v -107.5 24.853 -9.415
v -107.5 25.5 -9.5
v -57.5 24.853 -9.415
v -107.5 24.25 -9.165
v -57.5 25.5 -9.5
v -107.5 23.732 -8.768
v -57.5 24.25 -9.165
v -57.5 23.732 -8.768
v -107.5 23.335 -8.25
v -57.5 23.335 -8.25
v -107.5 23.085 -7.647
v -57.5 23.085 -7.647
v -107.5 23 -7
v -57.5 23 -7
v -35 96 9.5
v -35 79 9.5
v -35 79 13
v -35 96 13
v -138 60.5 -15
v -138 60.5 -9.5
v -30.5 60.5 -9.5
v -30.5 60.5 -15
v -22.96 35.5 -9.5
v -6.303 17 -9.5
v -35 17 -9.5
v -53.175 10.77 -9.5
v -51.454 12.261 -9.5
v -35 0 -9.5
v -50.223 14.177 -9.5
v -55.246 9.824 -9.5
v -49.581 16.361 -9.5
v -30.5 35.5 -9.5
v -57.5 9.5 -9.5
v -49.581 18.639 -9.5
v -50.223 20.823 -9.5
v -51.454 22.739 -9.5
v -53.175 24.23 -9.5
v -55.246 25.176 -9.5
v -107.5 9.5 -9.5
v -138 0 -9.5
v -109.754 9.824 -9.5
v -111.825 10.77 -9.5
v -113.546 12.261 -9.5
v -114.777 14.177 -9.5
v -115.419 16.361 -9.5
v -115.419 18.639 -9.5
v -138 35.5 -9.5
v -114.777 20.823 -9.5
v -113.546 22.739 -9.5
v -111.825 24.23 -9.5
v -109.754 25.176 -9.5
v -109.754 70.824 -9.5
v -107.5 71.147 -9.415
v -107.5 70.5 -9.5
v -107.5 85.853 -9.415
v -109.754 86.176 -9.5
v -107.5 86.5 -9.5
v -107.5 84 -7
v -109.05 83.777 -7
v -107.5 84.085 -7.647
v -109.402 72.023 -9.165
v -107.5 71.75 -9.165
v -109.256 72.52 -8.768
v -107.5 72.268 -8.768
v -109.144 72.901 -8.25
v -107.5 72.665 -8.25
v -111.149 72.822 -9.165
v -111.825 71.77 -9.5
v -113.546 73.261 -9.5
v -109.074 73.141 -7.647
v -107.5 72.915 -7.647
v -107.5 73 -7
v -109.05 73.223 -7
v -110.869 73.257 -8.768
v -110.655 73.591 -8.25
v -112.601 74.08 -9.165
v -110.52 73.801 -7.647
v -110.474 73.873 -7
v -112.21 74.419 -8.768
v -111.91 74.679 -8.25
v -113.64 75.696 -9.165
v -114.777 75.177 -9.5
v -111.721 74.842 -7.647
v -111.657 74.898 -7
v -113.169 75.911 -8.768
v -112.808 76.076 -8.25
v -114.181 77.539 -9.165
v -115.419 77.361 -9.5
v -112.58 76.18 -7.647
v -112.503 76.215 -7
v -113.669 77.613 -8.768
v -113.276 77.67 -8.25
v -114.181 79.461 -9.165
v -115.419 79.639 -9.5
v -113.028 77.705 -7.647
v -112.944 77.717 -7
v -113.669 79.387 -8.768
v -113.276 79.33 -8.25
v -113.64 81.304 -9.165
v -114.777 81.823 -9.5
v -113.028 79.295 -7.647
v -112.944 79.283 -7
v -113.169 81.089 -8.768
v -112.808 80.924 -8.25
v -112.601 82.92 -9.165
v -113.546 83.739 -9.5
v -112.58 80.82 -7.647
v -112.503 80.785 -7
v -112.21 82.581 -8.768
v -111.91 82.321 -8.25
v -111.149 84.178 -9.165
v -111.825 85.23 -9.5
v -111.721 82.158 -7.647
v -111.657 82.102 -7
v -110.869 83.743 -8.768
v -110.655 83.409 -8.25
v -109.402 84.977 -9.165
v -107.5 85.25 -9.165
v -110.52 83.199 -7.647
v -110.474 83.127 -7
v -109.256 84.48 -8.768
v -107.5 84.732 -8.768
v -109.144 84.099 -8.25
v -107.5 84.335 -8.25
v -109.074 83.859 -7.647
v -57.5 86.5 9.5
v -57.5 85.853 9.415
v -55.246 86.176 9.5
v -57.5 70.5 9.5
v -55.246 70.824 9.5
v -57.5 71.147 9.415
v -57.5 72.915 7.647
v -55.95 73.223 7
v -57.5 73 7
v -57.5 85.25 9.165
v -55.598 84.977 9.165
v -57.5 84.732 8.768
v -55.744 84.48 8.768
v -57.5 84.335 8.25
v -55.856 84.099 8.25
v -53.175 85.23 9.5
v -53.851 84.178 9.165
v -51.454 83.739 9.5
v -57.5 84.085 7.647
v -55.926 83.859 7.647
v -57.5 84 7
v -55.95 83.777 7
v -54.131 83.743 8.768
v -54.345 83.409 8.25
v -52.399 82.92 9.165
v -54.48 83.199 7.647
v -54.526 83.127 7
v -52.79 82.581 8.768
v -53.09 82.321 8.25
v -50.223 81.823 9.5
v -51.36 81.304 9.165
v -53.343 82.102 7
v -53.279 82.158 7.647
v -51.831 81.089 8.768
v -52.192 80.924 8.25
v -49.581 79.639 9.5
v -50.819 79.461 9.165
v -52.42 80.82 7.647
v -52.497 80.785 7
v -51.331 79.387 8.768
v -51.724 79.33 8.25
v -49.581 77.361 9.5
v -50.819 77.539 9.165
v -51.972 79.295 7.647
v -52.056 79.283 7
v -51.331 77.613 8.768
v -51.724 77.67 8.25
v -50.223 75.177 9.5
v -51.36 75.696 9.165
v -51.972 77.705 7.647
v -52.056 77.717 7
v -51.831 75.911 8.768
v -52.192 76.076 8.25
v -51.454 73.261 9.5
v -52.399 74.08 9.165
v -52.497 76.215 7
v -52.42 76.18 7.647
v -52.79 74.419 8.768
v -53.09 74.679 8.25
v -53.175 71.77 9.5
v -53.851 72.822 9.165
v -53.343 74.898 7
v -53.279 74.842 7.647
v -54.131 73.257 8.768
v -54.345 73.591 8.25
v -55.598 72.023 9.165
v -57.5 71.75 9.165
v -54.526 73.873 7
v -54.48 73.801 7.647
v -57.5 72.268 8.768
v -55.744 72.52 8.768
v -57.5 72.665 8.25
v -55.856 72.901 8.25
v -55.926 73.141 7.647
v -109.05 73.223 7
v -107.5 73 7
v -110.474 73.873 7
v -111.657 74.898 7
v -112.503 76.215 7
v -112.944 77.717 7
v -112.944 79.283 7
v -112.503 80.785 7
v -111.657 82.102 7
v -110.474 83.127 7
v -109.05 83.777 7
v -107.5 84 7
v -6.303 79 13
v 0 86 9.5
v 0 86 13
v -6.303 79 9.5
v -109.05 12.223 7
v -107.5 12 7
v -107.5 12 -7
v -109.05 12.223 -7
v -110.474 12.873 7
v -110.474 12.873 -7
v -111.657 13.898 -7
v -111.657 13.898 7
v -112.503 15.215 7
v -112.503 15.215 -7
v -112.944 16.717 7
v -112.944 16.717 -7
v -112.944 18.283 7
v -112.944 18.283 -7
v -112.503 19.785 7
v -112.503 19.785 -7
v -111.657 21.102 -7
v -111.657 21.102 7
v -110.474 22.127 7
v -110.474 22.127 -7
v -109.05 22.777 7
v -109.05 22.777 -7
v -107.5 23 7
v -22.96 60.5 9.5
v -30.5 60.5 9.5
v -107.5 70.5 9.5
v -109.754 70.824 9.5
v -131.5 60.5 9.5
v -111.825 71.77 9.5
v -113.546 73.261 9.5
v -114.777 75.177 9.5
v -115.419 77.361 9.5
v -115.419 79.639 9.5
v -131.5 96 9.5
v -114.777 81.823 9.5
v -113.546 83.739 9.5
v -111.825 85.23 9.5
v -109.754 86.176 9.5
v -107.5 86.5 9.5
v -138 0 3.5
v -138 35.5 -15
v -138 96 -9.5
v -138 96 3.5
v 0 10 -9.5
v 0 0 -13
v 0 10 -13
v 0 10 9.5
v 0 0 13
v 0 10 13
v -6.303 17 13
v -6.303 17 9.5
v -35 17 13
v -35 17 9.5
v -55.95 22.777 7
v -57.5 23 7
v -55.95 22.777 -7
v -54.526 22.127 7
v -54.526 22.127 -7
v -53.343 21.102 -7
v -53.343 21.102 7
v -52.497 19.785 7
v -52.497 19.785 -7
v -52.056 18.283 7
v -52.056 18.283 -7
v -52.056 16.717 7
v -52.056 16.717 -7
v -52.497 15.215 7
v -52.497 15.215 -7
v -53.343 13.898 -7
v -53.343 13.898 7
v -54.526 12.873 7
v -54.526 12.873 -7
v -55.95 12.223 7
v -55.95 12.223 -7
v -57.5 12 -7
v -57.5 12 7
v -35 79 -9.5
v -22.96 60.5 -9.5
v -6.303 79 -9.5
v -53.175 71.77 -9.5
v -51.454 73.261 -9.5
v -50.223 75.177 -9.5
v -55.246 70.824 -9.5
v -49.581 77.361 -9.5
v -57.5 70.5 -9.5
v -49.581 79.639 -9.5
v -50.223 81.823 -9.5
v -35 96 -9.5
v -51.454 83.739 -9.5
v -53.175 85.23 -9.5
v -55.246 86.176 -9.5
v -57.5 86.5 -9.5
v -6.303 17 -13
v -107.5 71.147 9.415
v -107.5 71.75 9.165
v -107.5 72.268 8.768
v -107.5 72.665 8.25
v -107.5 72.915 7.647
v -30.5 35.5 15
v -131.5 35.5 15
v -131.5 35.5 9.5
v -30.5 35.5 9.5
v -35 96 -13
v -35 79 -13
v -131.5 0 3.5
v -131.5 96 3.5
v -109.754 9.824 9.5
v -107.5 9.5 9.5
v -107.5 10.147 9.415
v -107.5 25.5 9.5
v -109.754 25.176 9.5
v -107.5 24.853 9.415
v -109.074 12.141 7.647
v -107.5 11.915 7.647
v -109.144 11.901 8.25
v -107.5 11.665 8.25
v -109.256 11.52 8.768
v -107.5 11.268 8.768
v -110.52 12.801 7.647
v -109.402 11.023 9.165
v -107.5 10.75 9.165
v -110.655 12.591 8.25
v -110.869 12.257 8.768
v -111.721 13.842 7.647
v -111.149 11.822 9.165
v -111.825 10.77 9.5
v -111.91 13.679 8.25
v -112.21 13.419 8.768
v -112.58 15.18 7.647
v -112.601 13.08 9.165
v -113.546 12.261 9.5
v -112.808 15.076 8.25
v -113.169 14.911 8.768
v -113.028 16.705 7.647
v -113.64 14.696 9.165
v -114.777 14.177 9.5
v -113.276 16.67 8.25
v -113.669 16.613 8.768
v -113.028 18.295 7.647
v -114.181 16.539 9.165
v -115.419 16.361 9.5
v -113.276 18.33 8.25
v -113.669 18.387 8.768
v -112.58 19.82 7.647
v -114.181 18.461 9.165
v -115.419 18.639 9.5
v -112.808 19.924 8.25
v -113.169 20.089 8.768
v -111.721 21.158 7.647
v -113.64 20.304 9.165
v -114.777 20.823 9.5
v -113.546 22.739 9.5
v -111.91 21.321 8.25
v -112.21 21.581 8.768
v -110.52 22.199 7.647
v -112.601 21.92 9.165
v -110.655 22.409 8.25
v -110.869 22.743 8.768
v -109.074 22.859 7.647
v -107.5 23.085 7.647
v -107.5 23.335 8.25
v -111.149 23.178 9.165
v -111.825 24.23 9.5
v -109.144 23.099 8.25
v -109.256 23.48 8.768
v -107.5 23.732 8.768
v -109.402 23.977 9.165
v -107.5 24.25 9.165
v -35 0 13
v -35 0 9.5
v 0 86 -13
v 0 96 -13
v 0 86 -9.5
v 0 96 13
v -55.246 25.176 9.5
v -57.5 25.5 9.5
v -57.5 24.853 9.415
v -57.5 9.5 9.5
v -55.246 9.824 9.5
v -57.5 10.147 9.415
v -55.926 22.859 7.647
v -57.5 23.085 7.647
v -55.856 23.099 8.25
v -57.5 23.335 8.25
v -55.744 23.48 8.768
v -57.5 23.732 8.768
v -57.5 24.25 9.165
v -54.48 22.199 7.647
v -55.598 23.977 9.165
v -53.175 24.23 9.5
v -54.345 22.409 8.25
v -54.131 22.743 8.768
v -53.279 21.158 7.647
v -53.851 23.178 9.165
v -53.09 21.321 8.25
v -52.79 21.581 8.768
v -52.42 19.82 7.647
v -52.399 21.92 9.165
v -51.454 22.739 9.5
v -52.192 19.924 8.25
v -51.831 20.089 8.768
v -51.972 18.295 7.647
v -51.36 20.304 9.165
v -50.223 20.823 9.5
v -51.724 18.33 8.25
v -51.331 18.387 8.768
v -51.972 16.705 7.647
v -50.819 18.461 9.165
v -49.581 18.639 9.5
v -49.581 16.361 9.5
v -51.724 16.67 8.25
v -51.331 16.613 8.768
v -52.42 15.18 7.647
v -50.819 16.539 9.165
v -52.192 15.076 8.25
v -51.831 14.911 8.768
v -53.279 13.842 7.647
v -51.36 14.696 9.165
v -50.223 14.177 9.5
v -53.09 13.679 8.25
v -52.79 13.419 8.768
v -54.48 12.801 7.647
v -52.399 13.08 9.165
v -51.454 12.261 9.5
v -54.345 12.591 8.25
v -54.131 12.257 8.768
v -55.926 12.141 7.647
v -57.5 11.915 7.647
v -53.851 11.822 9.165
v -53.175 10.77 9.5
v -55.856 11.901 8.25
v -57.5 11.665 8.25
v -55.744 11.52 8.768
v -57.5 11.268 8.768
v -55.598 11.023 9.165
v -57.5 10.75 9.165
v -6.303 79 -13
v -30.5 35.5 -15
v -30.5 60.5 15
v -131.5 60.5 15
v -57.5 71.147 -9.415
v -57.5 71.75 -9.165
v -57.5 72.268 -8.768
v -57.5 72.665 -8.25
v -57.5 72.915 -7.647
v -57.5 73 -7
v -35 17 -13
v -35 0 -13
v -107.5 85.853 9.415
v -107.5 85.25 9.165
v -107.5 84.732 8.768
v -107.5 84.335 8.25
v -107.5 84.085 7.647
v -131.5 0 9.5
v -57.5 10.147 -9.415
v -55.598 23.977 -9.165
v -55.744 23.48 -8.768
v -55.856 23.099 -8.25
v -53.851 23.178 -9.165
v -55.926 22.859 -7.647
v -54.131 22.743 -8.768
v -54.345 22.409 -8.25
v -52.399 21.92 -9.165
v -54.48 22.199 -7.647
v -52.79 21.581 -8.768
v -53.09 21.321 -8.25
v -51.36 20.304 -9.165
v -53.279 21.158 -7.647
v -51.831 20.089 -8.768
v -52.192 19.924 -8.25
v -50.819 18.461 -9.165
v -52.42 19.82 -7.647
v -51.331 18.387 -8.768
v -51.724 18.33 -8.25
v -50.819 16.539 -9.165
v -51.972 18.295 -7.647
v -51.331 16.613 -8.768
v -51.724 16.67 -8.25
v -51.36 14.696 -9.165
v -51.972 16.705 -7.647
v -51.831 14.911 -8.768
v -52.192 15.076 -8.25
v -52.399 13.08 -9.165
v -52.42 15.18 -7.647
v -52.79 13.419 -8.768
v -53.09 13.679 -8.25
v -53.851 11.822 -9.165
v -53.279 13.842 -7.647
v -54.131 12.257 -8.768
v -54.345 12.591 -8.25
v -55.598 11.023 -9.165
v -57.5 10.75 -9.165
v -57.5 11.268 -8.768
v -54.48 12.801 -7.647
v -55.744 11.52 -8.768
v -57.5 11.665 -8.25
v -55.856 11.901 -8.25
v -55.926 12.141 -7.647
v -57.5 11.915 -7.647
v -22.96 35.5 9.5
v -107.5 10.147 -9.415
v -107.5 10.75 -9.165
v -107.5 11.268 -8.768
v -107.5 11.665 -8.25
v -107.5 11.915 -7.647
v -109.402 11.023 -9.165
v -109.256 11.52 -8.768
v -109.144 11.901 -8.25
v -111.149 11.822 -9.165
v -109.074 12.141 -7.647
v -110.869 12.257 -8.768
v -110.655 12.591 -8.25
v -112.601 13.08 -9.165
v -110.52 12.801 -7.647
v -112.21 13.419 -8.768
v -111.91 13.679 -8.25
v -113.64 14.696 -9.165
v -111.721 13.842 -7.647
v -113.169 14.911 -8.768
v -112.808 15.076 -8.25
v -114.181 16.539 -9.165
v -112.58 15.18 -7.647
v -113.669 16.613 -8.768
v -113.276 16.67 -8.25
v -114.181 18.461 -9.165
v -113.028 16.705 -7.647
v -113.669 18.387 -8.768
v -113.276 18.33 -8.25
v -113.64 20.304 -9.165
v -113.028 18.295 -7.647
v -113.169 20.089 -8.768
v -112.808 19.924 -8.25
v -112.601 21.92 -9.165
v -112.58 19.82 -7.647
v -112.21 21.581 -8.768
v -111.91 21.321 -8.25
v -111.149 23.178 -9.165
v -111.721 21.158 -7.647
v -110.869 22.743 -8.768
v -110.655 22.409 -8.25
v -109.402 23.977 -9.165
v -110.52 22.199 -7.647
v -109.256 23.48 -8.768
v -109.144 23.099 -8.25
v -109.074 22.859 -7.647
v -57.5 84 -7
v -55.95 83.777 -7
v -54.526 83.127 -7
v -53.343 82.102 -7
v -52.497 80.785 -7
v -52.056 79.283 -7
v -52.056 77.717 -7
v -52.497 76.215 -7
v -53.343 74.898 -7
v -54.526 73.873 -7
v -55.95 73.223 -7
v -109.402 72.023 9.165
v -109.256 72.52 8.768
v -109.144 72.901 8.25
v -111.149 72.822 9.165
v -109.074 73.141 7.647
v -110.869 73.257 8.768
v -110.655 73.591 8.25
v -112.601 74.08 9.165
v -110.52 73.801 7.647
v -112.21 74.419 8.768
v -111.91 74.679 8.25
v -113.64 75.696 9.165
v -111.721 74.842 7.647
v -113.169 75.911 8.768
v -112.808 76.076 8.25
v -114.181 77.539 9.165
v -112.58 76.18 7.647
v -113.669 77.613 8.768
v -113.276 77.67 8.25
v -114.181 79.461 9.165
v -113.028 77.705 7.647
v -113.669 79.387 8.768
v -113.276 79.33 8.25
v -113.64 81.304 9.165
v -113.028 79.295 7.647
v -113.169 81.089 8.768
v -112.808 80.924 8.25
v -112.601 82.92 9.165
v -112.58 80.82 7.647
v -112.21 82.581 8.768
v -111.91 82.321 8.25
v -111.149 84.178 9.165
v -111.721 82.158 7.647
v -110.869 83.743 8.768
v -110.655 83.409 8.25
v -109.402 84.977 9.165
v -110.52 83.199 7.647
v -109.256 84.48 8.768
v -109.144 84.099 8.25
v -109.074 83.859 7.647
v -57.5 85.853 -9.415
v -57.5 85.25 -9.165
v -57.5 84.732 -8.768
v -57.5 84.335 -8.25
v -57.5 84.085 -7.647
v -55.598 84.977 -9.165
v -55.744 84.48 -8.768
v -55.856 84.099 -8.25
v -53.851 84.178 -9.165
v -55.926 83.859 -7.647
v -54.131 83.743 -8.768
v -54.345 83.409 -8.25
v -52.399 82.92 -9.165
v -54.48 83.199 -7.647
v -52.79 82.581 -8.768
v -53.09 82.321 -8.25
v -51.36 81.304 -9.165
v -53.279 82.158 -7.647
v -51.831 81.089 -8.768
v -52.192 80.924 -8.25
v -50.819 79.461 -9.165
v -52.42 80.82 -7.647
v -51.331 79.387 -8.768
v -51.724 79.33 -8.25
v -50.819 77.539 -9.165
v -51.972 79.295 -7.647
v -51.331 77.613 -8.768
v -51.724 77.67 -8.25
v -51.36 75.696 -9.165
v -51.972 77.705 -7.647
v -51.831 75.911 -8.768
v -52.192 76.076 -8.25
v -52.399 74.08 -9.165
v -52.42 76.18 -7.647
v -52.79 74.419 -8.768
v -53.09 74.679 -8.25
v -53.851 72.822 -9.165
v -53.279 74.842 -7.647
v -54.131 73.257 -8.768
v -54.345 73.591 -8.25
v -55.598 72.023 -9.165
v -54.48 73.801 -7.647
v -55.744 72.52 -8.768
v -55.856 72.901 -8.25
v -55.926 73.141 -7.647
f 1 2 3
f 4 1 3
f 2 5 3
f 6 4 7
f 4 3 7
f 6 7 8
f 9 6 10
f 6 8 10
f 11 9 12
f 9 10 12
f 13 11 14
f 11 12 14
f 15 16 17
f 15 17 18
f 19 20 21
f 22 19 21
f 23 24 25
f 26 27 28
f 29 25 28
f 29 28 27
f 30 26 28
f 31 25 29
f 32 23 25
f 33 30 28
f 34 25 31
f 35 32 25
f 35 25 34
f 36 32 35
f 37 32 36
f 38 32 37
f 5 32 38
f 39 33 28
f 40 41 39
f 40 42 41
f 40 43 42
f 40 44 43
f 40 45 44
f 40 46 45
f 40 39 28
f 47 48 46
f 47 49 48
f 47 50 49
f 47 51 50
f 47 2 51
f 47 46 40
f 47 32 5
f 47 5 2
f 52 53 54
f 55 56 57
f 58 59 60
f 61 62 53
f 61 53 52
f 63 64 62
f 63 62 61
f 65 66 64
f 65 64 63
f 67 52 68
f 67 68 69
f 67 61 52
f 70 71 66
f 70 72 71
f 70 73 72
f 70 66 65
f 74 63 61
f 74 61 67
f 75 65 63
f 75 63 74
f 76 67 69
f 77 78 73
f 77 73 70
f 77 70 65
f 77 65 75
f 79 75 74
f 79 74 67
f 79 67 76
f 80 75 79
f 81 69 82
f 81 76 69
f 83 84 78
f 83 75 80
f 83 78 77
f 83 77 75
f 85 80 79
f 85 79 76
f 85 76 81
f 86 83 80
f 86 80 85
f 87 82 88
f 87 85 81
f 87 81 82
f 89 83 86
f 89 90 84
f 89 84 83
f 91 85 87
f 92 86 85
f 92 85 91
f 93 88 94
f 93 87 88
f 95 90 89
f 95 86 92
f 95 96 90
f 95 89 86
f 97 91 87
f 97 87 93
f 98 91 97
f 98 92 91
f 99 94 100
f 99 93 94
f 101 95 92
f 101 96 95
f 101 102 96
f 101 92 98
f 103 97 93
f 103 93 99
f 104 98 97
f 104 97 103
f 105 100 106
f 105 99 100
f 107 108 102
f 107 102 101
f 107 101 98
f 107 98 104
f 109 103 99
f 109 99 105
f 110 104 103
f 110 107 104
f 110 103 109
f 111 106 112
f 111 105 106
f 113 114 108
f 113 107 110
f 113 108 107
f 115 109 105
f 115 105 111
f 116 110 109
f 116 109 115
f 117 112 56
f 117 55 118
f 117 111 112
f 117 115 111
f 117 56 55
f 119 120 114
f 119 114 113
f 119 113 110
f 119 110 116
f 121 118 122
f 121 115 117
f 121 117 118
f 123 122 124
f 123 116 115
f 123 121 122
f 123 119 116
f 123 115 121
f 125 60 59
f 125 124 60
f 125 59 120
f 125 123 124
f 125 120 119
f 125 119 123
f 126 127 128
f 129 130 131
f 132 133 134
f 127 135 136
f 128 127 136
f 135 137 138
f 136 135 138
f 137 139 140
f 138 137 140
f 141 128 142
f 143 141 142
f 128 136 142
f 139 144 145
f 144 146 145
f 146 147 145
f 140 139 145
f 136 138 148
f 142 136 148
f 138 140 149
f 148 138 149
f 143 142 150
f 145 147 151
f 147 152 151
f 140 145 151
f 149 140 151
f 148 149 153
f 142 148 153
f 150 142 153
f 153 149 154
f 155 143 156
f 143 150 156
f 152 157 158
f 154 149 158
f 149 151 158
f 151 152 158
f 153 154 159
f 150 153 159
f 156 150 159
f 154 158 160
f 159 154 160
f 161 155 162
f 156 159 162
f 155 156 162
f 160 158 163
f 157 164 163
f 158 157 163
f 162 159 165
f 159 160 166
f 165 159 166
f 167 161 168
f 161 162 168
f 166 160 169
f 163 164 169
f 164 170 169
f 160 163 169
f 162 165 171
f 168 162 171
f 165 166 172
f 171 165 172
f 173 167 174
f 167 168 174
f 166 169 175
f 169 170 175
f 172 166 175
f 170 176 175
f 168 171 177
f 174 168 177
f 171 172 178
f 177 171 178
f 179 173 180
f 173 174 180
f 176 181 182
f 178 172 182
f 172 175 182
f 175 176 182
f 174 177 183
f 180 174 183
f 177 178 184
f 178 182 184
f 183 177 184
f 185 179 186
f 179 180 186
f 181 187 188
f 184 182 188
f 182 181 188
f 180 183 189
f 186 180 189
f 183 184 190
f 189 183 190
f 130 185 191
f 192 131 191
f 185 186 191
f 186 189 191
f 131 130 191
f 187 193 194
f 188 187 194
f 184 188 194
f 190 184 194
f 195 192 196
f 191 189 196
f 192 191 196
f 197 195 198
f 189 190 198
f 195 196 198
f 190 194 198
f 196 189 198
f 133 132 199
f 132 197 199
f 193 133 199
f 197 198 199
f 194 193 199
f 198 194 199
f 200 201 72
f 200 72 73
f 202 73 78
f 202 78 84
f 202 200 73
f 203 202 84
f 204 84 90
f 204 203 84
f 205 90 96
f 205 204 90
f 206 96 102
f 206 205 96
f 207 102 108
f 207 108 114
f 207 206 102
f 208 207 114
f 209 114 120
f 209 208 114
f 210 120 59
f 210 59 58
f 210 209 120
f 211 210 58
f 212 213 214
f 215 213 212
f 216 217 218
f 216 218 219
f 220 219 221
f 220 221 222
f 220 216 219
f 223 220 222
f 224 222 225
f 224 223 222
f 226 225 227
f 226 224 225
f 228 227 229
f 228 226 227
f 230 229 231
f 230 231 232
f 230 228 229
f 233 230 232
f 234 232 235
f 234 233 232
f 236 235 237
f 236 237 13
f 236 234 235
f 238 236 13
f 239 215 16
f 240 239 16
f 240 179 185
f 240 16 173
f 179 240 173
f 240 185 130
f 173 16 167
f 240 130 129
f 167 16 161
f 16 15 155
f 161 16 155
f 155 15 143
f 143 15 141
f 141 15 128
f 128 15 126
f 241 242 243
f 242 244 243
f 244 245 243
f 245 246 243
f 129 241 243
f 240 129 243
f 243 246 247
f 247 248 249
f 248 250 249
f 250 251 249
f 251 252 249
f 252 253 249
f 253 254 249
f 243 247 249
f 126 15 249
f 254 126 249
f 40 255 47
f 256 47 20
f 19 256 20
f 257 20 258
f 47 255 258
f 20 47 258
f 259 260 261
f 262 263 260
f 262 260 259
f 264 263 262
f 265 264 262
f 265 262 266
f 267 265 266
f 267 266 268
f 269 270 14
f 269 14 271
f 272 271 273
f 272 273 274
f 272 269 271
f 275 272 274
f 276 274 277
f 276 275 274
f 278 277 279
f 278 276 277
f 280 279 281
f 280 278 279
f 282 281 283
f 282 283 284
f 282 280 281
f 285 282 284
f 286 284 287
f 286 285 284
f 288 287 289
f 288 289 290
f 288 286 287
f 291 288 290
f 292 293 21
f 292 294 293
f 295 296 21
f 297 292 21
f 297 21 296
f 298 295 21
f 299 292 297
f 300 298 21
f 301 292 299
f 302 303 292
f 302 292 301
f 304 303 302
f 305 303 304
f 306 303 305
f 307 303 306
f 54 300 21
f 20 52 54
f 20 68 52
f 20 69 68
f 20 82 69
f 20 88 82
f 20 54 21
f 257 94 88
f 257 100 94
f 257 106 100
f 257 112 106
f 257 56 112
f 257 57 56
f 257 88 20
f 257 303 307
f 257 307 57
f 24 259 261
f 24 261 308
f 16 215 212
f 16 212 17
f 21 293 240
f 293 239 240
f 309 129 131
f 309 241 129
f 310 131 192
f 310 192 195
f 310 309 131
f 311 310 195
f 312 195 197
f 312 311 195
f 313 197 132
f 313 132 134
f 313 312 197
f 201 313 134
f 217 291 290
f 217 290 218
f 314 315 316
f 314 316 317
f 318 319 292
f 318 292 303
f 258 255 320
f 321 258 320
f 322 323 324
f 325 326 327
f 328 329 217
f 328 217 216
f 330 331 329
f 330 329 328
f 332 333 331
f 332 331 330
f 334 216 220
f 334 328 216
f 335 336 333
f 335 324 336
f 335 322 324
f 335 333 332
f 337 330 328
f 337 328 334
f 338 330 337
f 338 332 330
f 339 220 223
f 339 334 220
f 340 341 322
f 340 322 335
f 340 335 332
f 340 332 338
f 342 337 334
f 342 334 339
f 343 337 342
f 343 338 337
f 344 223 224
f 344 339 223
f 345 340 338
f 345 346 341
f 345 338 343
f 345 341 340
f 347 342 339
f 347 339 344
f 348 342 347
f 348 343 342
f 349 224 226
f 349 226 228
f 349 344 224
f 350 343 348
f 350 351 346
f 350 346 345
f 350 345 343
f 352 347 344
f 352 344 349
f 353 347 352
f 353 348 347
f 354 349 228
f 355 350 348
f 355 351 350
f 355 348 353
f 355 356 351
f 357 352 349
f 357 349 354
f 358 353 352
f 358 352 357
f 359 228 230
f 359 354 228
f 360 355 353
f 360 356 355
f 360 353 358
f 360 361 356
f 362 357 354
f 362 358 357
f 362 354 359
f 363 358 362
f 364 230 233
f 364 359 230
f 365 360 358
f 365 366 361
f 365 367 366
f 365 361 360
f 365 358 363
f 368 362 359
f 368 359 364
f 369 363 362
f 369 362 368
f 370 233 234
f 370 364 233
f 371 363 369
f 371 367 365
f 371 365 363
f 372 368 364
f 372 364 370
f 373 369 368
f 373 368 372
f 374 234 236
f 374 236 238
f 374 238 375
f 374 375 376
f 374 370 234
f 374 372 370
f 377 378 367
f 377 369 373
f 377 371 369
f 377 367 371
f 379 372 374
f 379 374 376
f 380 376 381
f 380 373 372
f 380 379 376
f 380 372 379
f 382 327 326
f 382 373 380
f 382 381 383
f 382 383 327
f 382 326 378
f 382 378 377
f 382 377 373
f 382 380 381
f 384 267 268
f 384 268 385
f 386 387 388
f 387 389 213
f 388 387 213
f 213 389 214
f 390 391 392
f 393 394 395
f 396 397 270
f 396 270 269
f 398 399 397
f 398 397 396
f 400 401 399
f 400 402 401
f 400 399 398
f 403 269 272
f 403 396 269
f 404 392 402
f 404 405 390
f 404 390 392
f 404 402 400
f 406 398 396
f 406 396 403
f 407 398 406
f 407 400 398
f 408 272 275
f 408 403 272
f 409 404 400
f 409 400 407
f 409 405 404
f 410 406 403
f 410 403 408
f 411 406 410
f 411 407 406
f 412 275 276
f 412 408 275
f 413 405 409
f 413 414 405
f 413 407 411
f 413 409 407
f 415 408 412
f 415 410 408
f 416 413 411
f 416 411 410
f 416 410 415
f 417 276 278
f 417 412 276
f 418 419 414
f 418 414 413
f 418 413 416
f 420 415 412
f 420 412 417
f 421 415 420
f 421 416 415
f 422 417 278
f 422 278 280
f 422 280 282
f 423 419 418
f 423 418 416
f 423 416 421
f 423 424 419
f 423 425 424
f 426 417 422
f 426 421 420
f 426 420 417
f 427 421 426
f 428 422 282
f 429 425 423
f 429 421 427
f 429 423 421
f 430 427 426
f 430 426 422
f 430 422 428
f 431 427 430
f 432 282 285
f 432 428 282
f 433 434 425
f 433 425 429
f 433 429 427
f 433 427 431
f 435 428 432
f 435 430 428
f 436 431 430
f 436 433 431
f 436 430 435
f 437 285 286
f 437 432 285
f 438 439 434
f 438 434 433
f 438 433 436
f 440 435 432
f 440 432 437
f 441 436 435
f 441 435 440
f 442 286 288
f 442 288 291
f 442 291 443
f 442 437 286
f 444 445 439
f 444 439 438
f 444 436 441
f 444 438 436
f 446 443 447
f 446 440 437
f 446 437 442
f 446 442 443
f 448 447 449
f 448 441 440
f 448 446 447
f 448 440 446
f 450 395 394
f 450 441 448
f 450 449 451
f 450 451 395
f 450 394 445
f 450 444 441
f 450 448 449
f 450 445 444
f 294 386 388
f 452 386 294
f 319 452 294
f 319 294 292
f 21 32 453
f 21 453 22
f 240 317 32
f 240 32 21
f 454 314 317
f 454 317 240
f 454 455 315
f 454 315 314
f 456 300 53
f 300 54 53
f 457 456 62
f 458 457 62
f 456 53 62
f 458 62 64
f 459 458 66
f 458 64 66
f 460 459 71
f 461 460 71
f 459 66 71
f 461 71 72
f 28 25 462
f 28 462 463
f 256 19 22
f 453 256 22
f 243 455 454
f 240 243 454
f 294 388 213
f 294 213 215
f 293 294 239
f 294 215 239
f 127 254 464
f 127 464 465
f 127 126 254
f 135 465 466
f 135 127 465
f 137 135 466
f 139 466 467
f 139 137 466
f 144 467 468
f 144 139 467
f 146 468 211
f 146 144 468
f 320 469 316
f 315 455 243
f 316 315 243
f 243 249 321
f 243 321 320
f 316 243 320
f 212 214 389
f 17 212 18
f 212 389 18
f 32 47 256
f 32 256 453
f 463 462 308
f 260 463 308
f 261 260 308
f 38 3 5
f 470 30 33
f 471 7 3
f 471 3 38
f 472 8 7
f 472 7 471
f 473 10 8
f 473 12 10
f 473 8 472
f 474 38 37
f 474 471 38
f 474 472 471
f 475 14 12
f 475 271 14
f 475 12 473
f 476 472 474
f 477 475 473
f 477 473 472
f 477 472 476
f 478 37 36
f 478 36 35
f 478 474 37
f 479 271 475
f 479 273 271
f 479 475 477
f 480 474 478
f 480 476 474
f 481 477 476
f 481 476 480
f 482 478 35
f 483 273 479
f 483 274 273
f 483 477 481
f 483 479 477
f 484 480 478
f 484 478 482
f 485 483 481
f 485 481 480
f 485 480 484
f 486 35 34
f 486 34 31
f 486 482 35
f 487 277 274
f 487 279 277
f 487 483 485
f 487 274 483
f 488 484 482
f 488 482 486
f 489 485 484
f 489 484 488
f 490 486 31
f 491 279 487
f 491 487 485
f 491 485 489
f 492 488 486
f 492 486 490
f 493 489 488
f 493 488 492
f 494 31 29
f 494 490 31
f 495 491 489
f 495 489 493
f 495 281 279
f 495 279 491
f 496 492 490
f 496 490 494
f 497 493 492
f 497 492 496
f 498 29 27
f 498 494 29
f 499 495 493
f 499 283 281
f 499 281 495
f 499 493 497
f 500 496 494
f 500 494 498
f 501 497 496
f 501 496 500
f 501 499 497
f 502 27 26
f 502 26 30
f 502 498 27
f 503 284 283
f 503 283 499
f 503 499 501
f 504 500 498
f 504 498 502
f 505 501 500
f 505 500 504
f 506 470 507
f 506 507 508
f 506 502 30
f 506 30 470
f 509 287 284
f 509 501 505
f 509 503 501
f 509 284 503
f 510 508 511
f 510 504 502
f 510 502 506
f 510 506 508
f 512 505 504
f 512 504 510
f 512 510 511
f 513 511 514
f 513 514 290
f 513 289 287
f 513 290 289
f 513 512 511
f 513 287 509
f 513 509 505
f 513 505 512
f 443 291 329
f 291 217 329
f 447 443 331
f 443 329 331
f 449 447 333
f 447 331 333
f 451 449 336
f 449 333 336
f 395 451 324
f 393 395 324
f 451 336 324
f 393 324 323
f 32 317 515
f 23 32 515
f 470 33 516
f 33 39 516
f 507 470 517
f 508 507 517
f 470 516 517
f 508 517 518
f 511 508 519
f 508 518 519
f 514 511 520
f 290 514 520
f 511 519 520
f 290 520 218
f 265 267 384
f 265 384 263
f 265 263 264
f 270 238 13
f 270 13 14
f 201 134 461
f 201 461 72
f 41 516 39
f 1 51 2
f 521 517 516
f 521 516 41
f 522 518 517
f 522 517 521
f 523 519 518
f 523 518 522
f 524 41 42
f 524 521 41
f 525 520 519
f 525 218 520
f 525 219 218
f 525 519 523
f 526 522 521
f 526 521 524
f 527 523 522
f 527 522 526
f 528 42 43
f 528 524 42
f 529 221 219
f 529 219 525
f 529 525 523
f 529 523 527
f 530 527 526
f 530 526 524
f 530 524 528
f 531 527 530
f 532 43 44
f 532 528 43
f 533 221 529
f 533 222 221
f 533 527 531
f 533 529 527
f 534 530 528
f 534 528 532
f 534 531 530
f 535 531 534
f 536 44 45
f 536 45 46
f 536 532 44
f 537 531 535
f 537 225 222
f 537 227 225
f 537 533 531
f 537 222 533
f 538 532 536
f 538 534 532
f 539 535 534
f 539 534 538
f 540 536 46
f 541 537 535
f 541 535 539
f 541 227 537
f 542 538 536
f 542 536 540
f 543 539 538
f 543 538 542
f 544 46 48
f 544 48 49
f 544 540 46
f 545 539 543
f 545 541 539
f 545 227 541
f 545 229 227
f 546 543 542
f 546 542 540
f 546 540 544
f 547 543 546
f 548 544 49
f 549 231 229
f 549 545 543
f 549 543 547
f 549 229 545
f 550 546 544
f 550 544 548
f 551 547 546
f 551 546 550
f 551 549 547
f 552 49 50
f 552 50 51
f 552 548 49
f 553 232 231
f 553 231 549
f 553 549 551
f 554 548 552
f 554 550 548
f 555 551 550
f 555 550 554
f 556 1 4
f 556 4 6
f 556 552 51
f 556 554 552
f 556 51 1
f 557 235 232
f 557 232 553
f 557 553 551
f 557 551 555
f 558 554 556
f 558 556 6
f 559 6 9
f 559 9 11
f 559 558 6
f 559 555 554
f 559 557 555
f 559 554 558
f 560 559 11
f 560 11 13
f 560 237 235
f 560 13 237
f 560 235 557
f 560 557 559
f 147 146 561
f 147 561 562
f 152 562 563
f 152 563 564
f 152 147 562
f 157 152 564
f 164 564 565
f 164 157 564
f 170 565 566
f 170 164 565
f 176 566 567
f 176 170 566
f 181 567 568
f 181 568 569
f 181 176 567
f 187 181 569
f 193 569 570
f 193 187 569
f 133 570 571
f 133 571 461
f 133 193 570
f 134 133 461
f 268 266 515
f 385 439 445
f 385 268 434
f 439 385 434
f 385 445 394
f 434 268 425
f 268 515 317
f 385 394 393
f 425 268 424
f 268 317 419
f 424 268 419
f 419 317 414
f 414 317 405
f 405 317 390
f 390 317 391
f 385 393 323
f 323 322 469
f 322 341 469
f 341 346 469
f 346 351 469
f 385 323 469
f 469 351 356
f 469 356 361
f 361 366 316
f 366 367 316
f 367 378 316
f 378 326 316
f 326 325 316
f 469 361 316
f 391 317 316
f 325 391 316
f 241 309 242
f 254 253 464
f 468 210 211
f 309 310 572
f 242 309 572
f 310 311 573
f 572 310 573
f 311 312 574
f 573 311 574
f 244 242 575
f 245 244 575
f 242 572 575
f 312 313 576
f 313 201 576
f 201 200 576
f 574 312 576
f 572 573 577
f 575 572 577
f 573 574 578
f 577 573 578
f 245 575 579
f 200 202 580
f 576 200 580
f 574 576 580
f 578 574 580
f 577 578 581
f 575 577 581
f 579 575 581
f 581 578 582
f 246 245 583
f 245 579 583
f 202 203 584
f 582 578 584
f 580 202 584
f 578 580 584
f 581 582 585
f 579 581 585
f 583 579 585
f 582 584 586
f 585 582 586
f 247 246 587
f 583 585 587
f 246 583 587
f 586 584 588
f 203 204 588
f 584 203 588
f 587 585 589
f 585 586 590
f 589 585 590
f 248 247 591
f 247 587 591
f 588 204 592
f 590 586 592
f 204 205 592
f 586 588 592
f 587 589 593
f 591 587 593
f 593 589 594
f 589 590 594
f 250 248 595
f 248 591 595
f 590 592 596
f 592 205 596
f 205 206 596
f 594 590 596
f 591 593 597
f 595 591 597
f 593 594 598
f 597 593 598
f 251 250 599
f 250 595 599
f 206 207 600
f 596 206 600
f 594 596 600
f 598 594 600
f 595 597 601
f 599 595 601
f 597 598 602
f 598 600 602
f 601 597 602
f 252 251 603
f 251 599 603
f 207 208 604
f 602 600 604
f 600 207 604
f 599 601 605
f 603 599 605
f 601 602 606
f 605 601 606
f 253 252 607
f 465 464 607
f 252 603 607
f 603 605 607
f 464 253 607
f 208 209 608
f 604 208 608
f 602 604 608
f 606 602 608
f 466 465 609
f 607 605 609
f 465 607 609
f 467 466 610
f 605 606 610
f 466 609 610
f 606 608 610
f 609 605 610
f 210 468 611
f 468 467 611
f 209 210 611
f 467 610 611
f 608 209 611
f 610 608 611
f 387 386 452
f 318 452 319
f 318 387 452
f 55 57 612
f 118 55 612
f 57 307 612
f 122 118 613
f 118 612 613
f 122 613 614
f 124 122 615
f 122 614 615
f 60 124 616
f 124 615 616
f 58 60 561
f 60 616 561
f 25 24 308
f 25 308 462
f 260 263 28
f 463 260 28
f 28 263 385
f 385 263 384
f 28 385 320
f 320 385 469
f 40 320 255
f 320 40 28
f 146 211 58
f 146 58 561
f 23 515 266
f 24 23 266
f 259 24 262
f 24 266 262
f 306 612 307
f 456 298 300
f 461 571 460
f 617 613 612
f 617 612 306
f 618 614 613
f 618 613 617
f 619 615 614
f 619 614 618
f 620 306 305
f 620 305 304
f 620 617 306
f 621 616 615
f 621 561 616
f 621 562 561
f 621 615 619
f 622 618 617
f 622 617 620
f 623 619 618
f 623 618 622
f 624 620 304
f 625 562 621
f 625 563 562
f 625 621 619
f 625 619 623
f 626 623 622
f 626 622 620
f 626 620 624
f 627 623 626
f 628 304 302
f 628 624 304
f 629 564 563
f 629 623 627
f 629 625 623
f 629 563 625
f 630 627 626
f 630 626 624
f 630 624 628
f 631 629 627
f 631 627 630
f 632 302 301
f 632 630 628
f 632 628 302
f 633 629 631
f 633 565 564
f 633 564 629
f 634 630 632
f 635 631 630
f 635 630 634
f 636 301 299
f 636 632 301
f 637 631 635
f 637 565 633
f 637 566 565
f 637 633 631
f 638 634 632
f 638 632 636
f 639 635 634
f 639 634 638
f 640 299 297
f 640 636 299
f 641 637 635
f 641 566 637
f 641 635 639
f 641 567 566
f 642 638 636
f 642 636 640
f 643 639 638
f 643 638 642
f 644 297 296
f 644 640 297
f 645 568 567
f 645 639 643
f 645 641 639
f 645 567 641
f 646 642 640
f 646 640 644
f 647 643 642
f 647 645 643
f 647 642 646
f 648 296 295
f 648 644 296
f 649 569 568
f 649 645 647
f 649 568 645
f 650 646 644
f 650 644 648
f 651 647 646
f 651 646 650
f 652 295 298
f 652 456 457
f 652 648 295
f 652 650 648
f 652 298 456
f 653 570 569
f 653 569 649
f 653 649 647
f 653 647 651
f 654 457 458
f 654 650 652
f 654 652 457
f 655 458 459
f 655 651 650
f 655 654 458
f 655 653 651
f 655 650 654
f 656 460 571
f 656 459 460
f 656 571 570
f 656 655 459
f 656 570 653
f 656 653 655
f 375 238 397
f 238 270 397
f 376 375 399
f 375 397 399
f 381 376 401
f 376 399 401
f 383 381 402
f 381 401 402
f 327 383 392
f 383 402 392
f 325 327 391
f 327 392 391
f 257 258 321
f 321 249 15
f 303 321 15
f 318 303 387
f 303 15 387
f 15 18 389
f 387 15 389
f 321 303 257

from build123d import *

# Parameters (mm, degrees)
BOSS_EXTRUDE1_DEPTH = 9.5
SKETCH5_W           = 107.5
SKETCH5_H           = 25
BOSS_EXTRUDE4_DEPTH = 15
BOSS_EXTRUDE5_DEPTH = 13
SKETCH7_W           = 6.5
SKETCH7_H           = 11.5
CUT_EXTRUDE1_DEPTH  = 169.774998148
FILLET1_R           = 2.5


with BuildPart() as part:
    # Sketch1 → Boss-Extrude1 (new, symmetric)
    with BuildSketch(Plane.XY):
        Polygon((0, 0), (-138, 0), (-138, 96), (0, 96), (0, 86), (-22.96030313, 60.5), (-30.5, 60.5), (-30.5, 35.5), (-22.96030313, 35.5), (0, 10), align=None)
        with BuildLine():
            Line((-107.5, 84), (-57.5, 84))
            ThreePointArc((-57.5, 84), (-52, 78.5), (-57.5, 73))
            Line((-57.5, 73), (-107.5, 73))
            ThreePointArc((-107.5, 73), (-113, 78.5), (-107.5, 84))
        make_face(mode=Mode.SUBTRACT)
        with BuildLine():
            Line((-107.5, 23), (-57.5, 23))
            ThreePointArc((-57.5, 23), (-52, 17.5), (-57.5, 12))
            Line((-57.5, 12), (-107.5, 12))
            ThreePointArc((-107.5, 12), (-113, 17.5), (-107.5, 23))
        make_face(mode=Mode.SUBTRACT)
    extrude(amount=BOSS_EXTRUDE1_DEPTH, both=True)

    # Sketch5 → Boss-Extrude4 (add, symmetric)
    with BuildSketch(Plane.XY):
        with Locations((-84.25, 48)):
            Rectangle(SKETCH5_W, SKETCH5_H)
    extrude(amount=BOSS_EXTRUDE4_DEPTH, both=True)

    # Sketch6 → Boss-Extrude5 (add, symmetric)
    with BuildSketch(Plane.XY):
        Polygon((-6.30282831, 79), (-35, 79), (-35, 96), (0, 96), (0, 86), align=None)
        Polygon((-6.30282831, 17), (-35, 17), (-35, 0), (0, 0), (0, 10), align=None)
    extrude(amount=BOSS_EXTRUDE5_DEPTH, both=True)

    # Sketch7 → Cut-Extrude1 (cut, through all)
    with BuildSketch(Plane(origin=(0, 96, 0), x_dir=(1, 0, 0), z_dir=(0, 1, 0))):
        with Locations((-134.75, -9.25)):
            Rectangle(SKETCH7_W, SKETCH7_H)
    extrude(amount=-CUT_EXTRUDE1_DEPTH, mode=Mode.SUBTRACT)

    # Fillet1
    fillet1_edges = [part.edges().sort_by_distance(p)[0] for p in [
        (-113, 78.5, -9.5),
        (-82.5, 73, -9.5),
        (-52, 78.5, -9.5),
        (-82.5, 84, -9.5),
        (-113, 78.5, 9.5),
        (-82.5, 73, 9.5),
        (-52, 78.5, 9.5),
        (-82.5, 84, 9.5),
        (-113, 17.5, -9.5),
        (-82.5, 12, -9.5),
        (-52, 17.5, -9.5),
        (-82.5, 23, -9.5),
        (-113, 17.5, 9.5),
        (-82.5, 12, 9.5),
        (-52, 17.5, 9.5),
        (-82.5, 23, 9.5),
    ]]
    fillet(fillet1_edges, radius=FILLET1_R)


solid = part.part
